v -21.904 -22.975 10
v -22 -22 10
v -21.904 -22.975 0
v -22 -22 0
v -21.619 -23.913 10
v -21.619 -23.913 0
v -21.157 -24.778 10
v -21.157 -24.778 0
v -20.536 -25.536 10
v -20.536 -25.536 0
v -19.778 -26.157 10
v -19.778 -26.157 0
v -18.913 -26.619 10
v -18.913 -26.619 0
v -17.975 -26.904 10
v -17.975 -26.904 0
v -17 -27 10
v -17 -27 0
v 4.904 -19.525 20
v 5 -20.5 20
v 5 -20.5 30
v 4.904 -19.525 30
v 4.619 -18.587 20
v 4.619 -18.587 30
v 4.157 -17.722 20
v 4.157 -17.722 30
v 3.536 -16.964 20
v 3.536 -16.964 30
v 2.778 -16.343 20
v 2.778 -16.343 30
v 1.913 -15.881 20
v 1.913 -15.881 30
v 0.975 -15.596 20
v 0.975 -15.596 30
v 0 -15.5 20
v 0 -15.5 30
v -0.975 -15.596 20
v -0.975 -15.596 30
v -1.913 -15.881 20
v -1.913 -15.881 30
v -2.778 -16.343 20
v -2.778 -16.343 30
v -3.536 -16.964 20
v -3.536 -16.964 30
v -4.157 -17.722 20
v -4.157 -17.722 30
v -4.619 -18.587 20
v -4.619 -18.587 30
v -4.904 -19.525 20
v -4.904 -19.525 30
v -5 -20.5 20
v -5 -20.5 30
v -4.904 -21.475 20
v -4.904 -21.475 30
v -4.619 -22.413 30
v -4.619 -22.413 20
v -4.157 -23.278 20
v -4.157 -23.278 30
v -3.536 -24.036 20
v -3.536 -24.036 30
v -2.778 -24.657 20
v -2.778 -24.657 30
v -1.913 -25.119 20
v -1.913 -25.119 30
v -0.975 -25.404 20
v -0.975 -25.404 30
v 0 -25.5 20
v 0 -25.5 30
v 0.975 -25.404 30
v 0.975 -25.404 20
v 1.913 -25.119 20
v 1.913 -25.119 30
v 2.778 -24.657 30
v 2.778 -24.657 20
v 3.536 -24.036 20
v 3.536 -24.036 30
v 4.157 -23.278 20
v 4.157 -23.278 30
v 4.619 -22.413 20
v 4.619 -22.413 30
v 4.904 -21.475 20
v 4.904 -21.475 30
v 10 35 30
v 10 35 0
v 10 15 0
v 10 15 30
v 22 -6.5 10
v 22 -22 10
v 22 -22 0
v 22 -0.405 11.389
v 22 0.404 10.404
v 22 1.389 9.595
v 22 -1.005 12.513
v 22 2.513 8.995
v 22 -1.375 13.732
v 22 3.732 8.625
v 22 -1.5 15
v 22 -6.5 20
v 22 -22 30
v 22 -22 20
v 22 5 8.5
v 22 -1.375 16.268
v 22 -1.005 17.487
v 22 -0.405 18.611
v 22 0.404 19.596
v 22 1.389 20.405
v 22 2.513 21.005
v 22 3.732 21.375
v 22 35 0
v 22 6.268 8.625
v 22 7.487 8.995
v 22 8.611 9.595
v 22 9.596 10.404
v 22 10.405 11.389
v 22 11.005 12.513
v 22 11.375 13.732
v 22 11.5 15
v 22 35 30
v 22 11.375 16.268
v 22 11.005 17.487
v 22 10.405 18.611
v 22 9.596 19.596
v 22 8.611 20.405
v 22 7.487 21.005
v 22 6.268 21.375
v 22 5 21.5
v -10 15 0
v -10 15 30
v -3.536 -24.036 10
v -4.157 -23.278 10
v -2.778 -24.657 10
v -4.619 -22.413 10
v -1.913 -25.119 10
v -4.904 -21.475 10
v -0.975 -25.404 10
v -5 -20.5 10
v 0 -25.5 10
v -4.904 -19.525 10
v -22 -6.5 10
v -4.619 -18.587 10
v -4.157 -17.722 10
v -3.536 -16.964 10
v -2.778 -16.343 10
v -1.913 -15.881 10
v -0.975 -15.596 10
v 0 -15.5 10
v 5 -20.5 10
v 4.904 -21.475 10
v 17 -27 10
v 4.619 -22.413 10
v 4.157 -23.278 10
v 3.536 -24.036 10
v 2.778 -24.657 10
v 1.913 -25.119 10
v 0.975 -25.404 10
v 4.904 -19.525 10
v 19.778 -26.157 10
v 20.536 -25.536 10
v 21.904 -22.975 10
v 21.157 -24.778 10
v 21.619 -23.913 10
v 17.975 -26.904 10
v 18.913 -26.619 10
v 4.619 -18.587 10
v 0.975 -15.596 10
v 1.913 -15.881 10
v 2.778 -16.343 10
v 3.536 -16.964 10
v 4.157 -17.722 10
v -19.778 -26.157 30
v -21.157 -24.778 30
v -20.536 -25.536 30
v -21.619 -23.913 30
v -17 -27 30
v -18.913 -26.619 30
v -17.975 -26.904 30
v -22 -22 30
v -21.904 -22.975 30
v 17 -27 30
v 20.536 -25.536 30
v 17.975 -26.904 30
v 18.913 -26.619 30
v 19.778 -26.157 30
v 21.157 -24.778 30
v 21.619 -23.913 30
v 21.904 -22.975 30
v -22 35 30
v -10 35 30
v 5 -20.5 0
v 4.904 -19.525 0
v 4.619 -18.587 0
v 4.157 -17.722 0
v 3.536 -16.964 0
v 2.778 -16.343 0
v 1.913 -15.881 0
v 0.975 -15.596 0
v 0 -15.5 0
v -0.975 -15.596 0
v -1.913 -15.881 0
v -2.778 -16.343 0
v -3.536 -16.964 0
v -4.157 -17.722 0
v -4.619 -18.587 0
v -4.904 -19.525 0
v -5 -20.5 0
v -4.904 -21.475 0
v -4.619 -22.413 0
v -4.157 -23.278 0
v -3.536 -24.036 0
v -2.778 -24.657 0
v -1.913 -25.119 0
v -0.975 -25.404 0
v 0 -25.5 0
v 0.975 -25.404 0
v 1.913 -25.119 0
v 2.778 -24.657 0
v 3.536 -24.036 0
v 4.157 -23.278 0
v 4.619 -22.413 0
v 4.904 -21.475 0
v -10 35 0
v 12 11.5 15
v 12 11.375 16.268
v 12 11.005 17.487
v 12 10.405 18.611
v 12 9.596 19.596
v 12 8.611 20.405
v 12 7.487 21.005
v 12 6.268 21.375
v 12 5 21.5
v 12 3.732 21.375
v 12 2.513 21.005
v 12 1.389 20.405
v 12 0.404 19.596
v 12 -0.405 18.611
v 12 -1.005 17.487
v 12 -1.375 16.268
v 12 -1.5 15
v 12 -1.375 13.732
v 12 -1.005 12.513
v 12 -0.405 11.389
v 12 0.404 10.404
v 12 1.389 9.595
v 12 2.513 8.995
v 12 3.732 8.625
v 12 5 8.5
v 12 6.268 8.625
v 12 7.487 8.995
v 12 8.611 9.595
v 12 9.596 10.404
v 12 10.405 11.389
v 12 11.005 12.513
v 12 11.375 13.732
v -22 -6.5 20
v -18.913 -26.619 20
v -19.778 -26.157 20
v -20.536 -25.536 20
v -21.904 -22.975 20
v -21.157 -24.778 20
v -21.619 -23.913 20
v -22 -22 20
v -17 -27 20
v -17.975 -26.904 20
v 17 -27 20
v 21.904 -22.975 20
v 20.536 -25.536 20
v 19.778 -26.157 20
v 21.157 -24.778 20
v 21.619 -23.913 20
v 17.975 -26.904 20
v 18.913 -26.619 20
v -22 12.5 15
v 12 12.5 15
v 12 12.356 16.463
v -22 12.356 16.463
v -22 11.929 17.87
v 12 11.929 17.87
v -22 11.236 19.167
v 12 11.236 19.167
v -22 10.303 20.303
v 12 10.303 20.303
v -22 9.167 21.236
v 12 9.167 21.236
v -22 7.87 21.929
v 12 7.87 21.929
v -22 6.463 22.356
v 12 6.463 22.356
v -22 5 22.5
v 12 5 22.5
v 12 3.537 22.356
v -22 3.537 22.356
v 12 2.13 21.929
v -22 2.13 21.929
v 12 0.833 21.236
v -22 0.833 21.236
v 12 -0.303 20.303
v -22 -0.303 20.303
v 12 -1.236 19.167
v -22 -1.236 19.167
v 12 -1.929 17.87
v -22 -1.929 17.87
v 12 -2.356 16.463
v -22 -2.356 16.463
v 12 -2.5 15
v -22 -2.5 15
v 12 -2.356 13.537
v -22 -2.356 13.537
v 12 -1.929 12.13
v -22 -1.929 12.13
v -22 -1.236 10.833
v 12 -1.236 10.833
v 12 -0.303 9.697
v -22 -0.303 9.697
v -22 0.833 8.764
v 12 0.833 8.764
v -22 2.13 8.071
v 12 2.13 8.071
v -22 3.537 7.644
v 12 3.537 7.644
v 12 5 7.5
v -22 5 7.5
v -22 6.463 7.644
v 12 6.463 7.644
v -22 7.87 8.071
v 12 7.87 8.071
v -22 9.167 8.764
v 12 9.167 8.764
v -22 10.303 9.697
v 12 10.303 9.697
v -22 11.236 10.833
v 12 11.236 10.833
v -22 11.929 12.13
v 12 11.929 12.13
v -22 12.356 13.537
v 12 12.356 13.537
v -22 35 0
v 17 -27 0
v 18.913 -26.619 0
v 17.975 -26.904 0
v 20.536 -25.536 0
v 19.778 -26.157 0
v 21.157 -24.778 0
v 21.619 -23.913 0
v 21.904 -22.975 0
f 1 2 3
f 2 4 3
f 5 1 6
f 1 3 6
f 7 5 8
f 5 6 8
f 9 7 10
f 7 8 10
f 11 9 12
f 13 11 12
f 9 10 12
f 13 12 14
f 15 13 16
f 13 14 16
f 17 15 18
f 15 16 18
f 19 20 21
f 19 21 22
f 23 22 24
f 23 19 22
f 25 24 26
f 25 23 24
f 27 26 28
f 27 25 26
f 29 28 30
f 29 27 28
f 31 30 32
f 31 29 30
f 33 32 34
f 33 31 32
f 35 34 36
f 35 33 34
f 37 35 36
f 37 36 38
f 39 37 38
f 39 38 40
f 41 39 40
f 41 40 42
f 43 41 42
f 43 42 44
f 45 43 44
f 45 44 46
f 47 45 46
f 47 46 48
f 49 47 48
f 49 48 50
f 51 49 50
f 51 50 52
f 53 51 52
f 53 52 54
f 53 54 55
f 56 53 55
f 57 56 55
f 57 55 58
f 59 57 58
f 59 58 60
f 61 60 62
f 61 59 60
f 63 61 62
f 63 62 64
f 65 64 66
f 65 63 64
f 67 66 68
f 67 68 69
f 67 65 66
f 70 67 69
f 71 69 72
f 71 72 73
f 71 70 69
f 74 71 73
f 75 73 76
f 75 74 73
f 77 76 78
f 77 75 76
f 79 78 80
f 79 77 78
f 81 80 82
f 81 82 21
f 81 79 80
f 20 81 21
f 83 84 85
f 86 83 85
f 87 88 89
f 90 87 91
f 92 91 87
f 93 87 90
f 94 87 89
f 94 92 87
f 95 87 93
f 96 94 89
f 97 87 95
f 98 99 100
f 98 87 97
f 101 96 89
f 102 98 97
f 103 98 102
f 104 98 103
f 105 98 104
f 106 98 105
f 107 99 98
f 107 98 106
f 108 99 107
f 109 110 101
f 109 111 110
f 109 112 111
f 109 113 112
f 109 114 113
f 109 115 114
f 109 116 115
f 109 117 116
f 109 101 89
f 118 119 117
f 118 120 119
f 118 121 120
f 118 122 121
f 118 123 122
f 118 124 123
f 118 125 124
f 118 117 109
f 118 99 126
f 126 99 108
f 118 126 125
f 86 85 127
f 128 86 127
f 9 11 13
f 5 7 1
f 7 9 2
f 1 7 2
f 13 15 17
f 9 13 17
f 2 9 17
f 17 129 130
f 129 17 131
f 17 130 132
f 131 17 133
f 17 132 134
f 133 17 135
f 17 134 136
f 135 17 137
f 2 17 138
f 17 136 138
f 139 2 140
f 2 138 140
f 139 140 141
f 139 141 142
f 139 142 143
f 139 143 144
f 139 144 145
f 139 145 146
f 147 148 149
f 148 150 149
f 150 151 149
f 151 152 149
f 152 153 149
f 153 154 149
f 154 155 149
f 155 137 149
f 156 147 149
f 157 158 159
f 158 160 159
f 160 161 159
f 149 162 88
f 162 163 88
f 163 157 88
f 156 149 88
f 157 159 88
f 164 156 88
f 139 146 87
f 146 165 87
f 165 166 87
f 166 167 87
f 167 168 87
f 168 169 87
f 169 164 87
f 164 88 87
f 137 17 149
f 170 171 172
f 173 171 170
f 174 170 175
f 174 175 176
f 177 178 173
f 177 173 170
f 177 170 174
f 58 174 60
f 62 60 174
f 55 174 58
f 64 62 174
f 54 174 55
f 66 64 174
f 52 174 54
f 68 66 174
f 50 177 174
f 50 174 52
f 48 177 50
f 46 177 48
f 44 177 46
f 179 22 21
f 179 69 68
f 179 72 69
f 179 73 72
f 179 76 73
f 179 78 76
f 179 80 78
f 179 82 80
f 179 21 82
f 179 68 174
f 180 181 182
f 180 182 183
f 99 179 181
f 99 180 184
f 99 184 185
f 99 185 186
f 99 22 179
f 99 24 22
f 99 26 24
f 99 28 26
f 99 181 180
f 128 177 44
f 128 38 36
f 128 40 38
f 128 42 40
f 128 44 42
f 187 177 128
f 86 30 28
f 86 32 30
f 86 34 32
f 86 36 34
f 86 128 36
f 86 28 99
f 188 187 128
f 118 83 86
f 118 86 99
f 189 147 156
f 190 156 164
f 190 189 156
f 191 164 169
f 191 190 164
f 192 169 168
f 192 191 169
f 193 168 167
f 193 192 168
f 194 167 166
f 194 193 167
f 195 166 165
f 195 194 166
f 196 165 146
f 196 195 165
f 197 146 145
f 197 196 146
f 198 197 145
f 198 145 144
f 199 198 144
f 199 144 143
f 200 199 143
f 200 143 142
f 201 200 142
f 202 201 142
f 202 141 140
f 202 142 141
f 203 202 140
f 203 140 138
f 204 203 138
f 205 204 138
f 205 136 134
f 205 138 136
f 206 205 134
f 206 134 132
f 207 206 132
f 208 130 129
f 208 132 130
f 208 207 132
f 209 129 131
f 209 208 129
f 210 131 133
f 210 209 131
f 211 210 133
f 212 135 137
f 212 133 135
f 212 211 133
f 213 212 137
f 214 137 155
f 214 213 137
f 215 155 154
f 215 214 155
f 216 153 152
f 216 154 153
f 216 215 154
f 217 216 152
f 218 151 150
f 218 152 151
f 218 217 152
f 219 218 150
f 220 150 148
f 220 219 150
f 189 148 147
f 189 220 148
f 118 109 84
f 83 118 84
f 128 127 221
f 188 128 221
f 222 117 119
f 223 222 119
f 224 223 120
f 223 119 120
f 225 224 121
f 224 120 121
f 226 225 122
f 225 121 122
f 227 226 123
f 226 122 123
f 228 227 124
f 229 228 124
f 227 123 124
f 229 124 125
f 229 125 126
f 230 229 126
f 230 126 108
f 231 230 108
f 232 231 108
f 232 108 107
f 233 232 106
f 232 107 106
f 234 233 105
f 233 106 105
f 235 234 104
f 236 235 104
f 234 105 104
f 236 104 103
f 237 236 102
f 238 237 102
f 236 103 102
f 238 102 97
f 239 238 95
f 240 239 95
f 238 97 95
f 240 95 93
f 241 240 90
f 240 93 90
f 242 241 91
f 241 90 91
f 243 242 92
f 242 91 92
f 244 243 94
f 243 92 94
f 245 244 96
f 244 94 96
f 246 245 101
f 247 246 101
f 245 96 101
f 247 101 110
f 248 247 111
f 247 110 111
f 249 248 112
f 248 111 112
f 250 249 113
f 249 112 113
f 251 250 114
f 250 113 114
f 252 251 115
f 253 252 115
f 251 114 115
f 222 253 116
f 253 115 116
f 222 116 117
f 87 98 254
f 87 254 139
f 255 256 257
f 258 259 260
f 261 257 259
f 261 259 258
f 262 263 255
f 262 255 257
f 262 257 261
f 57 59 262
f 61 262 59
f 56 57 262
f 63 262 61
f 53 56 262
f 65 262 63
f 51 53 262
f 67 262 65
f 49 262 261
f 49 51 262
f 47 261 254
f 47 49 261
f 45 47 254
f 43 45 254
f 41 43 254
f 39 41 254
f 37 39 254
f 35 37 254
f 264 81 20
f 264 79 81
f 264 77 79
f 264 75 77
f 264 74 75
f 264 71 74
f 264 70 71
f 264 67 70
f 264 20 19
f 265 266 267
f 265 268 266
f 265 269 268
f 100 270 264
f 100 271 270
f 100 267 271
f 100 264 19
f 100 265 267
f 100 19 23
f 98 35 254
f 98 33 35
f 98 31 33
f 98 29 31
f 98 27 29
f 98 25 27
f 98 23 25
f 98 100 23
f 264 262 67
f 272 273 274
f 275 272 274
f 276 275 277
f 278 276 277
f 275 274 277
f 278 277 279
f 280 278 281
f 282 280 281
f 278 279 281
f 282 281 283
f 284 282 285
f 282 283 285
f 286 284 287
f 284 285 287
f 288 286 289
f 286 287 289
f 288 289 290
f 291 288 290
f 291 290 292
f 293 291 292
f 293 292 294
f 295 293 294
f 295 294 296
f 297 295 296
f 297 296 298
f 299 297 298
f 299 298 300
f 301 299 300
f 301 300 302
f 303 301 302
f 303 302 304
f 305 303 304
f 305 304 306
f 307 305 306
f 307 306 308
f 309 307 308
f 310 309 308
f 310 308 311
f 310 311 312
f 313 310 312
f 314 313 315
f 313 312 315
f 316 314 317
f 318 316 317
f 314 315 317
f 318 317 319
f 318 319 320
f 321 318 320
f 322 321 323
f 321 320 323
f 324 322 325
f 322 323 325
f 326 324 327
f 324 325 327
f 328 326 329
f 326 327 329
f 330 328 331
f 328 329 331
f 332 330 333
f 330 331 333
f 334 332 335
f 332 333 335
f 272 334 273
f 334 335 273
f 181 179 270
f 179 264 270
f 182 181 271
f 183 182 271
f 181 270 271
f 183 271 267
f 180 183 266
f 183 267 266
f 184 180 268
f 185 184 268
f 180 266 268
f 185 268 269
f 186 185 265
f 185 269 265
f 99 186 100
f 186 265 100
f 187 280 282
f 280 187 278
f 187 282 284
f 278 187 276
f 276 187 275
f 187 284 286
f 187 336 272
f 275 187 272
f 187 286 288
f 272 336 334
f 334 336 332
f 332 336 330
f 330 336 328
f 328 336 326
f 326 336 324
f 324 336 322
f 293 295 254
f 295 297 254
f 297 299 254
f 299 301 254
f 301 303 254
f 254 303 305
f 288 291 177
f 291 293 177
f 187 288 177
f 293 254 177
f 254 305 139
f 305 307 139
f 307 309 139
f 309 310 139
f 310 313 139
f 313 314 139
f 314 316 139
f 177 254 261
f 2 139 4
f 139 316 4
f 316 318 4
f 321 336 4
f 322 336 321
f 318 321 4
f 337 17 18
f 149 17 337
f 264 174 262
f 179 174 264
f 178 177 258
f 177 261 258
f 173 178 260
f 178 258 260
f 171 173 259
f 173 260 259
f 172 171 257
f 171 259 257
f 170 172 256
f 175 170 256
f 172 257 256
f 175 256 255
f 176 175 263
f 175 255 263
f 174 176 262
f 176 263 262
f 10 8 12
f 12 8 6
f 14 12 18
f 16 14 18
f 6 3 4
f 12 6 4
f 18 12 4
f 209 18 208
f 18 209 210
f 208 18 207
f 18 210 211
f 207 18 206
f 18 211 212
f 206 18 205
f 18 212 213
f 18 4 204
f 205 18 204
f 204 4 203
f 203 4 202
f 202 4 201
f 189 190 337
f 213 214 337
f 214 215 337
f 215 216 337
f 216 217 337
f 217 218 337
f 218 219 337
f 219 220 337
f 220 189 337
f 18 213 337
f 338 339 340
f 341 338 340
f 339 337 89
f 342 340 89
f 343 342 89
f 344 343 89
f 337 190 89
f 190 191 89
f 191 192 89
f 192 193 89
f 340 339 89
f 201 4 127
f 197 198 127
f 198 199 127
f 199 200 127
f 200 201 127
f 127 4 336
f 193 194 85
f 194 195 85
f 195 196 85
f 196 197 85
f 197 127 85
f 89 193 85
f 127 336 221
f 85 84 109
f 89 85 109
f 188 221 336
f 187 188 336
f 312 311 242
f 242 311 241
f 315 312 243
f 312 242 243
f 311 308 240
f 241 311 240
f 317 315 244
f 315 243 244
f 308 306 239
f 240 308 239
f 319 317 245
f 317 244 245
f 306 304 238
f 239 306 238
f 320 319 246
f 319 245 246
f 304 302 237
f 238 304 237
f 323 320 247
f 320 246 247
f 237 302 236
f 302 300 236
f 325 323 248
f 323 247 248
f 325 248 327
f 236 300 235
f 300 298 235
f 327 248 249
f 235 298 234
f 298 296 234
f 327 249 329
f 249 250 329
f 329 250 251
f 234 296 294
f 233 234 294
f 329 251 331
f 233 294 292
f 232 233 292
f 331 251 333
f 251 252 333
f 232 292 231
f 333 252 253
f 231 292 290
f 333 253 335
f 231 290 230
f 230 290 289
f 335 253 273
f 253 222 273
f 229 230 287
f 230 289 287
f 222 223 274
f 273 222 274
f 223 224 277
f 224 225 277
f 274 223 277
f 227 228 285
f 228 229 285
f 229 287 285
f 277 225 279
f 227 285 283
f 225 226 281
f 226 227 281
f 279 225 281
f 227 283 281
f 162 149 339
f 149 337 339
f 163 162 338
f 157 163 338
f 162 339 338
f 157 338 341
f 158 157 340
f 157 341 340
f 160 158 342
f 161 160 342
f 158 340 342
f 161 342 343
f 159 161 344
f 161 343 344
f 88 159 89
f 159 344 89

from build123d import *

# Parameters (mm, degrees)
CROQUIS1_R              = 5
BASE_DEPTH              = 30
CROQUIS4_R              = 7.5
CORTAR_EXTRUIR3_DEPTH   = 64.725975865
CROQUIS7_W              = 10
CROQUIS7_H              = 28.5
CORTAR_EXTRUIR6_DEPTH   = 64.725975865
CROQUIS8_W              = 44
CROQUIS8_H              = 8
CORTAR_EXTRUIR7_DEPTH   = 52.078371156
REDONDEO3_R             = 5
CROQUIS10_R             = 7.5
CROQUIS10_R_2           = 6.5
SALIENTE_EXTRUIR2_DEPTH = 10


with BuildPart() as part:
    # Croquis1 → Base (new body)
    with BuildSketch(Plane.XY):
        Polygon((-10, 35), (-22, 35), (-22, -35), (22, -35), (22, 35), (10, 35), (10, 15), (-10, 15), align=None)
        with Locations((0, -20.5)):
            Circle(CROQUIS1_R, mode=Mode.SUBTRACT)
    extrude(amount=BASE_DEPTH)

    # Croquis4 → Cortar-Extruir3 (cut, through all)
    with BuildSketch(Plane(origin=(22, 0, 0), x_dir=(0, 0, -1), z_dir=(1, 0, 0))):
        with Locations(Location((-15, 5, 0), (0, 0, 90))):
            Circle(CROQUIS4_R)
    extrude(amount=-CORTAR_EXTRUIR3_DEPTH, mode=Mode.SUBTRACT)

    # Croquis7 → Cortar-Extruir6 (cut, through all)
    with BuildSketch(Plane(origin=(22, 0, 0), x_dir=(0, 0, -1), z_dir=(1, 0, 0))):
        with Locations((-15, -20.75)):
            Rectangle(CROQUIS7_W, CROQUIS7_H)
    extrude(amount=-CORTAR_EXTRUIR6_DEPTH, mode=Mode.SUBTRACT)

    # Croquis8 → Cortar-Extruir7 (cut, through all)
    with BuildSketch(Plane.XY.offset(30)):
        with Locations((0, -31)):
            Rectangle(CROQUIS8_W, CROQUIS8_H)
    extrude(amount=-CORTAR_EXTRUIR7_DEPTH, mode=Mode.SUBTRACT)

    # Redondeo3
    redondeo3_edges = [part.edges().sort_by_distance(p)[0] for p in [
        (-22, -27, 25),
        (-22, -27, 5),
        (22, -27, 25),
        (22, -27, 5),
    ]]
    fillet(redondeo3_edges, radius=REDONDEO3_R)

    # Croquis10 → Saliente-Extruir2 (add)
    with BuildSketch(Plane(origin=(22, 0, 0), x_dir=(0, 0, -1), z_dir=(1, 0, 0))):
        with Locations(Location((-15, 5, 0), (0, 0, 90))):
            Circle(CROQUIS10_R)
        with Locations(Location((-15, 5, 0), (0, 0, 90))):
            Circle(CROQUIS10_R_2, mode=Mode.SUBTRACT)
    extrude(amount=-SALIENTE_EXTRUIR2_DEPTH)


solid = part.part
